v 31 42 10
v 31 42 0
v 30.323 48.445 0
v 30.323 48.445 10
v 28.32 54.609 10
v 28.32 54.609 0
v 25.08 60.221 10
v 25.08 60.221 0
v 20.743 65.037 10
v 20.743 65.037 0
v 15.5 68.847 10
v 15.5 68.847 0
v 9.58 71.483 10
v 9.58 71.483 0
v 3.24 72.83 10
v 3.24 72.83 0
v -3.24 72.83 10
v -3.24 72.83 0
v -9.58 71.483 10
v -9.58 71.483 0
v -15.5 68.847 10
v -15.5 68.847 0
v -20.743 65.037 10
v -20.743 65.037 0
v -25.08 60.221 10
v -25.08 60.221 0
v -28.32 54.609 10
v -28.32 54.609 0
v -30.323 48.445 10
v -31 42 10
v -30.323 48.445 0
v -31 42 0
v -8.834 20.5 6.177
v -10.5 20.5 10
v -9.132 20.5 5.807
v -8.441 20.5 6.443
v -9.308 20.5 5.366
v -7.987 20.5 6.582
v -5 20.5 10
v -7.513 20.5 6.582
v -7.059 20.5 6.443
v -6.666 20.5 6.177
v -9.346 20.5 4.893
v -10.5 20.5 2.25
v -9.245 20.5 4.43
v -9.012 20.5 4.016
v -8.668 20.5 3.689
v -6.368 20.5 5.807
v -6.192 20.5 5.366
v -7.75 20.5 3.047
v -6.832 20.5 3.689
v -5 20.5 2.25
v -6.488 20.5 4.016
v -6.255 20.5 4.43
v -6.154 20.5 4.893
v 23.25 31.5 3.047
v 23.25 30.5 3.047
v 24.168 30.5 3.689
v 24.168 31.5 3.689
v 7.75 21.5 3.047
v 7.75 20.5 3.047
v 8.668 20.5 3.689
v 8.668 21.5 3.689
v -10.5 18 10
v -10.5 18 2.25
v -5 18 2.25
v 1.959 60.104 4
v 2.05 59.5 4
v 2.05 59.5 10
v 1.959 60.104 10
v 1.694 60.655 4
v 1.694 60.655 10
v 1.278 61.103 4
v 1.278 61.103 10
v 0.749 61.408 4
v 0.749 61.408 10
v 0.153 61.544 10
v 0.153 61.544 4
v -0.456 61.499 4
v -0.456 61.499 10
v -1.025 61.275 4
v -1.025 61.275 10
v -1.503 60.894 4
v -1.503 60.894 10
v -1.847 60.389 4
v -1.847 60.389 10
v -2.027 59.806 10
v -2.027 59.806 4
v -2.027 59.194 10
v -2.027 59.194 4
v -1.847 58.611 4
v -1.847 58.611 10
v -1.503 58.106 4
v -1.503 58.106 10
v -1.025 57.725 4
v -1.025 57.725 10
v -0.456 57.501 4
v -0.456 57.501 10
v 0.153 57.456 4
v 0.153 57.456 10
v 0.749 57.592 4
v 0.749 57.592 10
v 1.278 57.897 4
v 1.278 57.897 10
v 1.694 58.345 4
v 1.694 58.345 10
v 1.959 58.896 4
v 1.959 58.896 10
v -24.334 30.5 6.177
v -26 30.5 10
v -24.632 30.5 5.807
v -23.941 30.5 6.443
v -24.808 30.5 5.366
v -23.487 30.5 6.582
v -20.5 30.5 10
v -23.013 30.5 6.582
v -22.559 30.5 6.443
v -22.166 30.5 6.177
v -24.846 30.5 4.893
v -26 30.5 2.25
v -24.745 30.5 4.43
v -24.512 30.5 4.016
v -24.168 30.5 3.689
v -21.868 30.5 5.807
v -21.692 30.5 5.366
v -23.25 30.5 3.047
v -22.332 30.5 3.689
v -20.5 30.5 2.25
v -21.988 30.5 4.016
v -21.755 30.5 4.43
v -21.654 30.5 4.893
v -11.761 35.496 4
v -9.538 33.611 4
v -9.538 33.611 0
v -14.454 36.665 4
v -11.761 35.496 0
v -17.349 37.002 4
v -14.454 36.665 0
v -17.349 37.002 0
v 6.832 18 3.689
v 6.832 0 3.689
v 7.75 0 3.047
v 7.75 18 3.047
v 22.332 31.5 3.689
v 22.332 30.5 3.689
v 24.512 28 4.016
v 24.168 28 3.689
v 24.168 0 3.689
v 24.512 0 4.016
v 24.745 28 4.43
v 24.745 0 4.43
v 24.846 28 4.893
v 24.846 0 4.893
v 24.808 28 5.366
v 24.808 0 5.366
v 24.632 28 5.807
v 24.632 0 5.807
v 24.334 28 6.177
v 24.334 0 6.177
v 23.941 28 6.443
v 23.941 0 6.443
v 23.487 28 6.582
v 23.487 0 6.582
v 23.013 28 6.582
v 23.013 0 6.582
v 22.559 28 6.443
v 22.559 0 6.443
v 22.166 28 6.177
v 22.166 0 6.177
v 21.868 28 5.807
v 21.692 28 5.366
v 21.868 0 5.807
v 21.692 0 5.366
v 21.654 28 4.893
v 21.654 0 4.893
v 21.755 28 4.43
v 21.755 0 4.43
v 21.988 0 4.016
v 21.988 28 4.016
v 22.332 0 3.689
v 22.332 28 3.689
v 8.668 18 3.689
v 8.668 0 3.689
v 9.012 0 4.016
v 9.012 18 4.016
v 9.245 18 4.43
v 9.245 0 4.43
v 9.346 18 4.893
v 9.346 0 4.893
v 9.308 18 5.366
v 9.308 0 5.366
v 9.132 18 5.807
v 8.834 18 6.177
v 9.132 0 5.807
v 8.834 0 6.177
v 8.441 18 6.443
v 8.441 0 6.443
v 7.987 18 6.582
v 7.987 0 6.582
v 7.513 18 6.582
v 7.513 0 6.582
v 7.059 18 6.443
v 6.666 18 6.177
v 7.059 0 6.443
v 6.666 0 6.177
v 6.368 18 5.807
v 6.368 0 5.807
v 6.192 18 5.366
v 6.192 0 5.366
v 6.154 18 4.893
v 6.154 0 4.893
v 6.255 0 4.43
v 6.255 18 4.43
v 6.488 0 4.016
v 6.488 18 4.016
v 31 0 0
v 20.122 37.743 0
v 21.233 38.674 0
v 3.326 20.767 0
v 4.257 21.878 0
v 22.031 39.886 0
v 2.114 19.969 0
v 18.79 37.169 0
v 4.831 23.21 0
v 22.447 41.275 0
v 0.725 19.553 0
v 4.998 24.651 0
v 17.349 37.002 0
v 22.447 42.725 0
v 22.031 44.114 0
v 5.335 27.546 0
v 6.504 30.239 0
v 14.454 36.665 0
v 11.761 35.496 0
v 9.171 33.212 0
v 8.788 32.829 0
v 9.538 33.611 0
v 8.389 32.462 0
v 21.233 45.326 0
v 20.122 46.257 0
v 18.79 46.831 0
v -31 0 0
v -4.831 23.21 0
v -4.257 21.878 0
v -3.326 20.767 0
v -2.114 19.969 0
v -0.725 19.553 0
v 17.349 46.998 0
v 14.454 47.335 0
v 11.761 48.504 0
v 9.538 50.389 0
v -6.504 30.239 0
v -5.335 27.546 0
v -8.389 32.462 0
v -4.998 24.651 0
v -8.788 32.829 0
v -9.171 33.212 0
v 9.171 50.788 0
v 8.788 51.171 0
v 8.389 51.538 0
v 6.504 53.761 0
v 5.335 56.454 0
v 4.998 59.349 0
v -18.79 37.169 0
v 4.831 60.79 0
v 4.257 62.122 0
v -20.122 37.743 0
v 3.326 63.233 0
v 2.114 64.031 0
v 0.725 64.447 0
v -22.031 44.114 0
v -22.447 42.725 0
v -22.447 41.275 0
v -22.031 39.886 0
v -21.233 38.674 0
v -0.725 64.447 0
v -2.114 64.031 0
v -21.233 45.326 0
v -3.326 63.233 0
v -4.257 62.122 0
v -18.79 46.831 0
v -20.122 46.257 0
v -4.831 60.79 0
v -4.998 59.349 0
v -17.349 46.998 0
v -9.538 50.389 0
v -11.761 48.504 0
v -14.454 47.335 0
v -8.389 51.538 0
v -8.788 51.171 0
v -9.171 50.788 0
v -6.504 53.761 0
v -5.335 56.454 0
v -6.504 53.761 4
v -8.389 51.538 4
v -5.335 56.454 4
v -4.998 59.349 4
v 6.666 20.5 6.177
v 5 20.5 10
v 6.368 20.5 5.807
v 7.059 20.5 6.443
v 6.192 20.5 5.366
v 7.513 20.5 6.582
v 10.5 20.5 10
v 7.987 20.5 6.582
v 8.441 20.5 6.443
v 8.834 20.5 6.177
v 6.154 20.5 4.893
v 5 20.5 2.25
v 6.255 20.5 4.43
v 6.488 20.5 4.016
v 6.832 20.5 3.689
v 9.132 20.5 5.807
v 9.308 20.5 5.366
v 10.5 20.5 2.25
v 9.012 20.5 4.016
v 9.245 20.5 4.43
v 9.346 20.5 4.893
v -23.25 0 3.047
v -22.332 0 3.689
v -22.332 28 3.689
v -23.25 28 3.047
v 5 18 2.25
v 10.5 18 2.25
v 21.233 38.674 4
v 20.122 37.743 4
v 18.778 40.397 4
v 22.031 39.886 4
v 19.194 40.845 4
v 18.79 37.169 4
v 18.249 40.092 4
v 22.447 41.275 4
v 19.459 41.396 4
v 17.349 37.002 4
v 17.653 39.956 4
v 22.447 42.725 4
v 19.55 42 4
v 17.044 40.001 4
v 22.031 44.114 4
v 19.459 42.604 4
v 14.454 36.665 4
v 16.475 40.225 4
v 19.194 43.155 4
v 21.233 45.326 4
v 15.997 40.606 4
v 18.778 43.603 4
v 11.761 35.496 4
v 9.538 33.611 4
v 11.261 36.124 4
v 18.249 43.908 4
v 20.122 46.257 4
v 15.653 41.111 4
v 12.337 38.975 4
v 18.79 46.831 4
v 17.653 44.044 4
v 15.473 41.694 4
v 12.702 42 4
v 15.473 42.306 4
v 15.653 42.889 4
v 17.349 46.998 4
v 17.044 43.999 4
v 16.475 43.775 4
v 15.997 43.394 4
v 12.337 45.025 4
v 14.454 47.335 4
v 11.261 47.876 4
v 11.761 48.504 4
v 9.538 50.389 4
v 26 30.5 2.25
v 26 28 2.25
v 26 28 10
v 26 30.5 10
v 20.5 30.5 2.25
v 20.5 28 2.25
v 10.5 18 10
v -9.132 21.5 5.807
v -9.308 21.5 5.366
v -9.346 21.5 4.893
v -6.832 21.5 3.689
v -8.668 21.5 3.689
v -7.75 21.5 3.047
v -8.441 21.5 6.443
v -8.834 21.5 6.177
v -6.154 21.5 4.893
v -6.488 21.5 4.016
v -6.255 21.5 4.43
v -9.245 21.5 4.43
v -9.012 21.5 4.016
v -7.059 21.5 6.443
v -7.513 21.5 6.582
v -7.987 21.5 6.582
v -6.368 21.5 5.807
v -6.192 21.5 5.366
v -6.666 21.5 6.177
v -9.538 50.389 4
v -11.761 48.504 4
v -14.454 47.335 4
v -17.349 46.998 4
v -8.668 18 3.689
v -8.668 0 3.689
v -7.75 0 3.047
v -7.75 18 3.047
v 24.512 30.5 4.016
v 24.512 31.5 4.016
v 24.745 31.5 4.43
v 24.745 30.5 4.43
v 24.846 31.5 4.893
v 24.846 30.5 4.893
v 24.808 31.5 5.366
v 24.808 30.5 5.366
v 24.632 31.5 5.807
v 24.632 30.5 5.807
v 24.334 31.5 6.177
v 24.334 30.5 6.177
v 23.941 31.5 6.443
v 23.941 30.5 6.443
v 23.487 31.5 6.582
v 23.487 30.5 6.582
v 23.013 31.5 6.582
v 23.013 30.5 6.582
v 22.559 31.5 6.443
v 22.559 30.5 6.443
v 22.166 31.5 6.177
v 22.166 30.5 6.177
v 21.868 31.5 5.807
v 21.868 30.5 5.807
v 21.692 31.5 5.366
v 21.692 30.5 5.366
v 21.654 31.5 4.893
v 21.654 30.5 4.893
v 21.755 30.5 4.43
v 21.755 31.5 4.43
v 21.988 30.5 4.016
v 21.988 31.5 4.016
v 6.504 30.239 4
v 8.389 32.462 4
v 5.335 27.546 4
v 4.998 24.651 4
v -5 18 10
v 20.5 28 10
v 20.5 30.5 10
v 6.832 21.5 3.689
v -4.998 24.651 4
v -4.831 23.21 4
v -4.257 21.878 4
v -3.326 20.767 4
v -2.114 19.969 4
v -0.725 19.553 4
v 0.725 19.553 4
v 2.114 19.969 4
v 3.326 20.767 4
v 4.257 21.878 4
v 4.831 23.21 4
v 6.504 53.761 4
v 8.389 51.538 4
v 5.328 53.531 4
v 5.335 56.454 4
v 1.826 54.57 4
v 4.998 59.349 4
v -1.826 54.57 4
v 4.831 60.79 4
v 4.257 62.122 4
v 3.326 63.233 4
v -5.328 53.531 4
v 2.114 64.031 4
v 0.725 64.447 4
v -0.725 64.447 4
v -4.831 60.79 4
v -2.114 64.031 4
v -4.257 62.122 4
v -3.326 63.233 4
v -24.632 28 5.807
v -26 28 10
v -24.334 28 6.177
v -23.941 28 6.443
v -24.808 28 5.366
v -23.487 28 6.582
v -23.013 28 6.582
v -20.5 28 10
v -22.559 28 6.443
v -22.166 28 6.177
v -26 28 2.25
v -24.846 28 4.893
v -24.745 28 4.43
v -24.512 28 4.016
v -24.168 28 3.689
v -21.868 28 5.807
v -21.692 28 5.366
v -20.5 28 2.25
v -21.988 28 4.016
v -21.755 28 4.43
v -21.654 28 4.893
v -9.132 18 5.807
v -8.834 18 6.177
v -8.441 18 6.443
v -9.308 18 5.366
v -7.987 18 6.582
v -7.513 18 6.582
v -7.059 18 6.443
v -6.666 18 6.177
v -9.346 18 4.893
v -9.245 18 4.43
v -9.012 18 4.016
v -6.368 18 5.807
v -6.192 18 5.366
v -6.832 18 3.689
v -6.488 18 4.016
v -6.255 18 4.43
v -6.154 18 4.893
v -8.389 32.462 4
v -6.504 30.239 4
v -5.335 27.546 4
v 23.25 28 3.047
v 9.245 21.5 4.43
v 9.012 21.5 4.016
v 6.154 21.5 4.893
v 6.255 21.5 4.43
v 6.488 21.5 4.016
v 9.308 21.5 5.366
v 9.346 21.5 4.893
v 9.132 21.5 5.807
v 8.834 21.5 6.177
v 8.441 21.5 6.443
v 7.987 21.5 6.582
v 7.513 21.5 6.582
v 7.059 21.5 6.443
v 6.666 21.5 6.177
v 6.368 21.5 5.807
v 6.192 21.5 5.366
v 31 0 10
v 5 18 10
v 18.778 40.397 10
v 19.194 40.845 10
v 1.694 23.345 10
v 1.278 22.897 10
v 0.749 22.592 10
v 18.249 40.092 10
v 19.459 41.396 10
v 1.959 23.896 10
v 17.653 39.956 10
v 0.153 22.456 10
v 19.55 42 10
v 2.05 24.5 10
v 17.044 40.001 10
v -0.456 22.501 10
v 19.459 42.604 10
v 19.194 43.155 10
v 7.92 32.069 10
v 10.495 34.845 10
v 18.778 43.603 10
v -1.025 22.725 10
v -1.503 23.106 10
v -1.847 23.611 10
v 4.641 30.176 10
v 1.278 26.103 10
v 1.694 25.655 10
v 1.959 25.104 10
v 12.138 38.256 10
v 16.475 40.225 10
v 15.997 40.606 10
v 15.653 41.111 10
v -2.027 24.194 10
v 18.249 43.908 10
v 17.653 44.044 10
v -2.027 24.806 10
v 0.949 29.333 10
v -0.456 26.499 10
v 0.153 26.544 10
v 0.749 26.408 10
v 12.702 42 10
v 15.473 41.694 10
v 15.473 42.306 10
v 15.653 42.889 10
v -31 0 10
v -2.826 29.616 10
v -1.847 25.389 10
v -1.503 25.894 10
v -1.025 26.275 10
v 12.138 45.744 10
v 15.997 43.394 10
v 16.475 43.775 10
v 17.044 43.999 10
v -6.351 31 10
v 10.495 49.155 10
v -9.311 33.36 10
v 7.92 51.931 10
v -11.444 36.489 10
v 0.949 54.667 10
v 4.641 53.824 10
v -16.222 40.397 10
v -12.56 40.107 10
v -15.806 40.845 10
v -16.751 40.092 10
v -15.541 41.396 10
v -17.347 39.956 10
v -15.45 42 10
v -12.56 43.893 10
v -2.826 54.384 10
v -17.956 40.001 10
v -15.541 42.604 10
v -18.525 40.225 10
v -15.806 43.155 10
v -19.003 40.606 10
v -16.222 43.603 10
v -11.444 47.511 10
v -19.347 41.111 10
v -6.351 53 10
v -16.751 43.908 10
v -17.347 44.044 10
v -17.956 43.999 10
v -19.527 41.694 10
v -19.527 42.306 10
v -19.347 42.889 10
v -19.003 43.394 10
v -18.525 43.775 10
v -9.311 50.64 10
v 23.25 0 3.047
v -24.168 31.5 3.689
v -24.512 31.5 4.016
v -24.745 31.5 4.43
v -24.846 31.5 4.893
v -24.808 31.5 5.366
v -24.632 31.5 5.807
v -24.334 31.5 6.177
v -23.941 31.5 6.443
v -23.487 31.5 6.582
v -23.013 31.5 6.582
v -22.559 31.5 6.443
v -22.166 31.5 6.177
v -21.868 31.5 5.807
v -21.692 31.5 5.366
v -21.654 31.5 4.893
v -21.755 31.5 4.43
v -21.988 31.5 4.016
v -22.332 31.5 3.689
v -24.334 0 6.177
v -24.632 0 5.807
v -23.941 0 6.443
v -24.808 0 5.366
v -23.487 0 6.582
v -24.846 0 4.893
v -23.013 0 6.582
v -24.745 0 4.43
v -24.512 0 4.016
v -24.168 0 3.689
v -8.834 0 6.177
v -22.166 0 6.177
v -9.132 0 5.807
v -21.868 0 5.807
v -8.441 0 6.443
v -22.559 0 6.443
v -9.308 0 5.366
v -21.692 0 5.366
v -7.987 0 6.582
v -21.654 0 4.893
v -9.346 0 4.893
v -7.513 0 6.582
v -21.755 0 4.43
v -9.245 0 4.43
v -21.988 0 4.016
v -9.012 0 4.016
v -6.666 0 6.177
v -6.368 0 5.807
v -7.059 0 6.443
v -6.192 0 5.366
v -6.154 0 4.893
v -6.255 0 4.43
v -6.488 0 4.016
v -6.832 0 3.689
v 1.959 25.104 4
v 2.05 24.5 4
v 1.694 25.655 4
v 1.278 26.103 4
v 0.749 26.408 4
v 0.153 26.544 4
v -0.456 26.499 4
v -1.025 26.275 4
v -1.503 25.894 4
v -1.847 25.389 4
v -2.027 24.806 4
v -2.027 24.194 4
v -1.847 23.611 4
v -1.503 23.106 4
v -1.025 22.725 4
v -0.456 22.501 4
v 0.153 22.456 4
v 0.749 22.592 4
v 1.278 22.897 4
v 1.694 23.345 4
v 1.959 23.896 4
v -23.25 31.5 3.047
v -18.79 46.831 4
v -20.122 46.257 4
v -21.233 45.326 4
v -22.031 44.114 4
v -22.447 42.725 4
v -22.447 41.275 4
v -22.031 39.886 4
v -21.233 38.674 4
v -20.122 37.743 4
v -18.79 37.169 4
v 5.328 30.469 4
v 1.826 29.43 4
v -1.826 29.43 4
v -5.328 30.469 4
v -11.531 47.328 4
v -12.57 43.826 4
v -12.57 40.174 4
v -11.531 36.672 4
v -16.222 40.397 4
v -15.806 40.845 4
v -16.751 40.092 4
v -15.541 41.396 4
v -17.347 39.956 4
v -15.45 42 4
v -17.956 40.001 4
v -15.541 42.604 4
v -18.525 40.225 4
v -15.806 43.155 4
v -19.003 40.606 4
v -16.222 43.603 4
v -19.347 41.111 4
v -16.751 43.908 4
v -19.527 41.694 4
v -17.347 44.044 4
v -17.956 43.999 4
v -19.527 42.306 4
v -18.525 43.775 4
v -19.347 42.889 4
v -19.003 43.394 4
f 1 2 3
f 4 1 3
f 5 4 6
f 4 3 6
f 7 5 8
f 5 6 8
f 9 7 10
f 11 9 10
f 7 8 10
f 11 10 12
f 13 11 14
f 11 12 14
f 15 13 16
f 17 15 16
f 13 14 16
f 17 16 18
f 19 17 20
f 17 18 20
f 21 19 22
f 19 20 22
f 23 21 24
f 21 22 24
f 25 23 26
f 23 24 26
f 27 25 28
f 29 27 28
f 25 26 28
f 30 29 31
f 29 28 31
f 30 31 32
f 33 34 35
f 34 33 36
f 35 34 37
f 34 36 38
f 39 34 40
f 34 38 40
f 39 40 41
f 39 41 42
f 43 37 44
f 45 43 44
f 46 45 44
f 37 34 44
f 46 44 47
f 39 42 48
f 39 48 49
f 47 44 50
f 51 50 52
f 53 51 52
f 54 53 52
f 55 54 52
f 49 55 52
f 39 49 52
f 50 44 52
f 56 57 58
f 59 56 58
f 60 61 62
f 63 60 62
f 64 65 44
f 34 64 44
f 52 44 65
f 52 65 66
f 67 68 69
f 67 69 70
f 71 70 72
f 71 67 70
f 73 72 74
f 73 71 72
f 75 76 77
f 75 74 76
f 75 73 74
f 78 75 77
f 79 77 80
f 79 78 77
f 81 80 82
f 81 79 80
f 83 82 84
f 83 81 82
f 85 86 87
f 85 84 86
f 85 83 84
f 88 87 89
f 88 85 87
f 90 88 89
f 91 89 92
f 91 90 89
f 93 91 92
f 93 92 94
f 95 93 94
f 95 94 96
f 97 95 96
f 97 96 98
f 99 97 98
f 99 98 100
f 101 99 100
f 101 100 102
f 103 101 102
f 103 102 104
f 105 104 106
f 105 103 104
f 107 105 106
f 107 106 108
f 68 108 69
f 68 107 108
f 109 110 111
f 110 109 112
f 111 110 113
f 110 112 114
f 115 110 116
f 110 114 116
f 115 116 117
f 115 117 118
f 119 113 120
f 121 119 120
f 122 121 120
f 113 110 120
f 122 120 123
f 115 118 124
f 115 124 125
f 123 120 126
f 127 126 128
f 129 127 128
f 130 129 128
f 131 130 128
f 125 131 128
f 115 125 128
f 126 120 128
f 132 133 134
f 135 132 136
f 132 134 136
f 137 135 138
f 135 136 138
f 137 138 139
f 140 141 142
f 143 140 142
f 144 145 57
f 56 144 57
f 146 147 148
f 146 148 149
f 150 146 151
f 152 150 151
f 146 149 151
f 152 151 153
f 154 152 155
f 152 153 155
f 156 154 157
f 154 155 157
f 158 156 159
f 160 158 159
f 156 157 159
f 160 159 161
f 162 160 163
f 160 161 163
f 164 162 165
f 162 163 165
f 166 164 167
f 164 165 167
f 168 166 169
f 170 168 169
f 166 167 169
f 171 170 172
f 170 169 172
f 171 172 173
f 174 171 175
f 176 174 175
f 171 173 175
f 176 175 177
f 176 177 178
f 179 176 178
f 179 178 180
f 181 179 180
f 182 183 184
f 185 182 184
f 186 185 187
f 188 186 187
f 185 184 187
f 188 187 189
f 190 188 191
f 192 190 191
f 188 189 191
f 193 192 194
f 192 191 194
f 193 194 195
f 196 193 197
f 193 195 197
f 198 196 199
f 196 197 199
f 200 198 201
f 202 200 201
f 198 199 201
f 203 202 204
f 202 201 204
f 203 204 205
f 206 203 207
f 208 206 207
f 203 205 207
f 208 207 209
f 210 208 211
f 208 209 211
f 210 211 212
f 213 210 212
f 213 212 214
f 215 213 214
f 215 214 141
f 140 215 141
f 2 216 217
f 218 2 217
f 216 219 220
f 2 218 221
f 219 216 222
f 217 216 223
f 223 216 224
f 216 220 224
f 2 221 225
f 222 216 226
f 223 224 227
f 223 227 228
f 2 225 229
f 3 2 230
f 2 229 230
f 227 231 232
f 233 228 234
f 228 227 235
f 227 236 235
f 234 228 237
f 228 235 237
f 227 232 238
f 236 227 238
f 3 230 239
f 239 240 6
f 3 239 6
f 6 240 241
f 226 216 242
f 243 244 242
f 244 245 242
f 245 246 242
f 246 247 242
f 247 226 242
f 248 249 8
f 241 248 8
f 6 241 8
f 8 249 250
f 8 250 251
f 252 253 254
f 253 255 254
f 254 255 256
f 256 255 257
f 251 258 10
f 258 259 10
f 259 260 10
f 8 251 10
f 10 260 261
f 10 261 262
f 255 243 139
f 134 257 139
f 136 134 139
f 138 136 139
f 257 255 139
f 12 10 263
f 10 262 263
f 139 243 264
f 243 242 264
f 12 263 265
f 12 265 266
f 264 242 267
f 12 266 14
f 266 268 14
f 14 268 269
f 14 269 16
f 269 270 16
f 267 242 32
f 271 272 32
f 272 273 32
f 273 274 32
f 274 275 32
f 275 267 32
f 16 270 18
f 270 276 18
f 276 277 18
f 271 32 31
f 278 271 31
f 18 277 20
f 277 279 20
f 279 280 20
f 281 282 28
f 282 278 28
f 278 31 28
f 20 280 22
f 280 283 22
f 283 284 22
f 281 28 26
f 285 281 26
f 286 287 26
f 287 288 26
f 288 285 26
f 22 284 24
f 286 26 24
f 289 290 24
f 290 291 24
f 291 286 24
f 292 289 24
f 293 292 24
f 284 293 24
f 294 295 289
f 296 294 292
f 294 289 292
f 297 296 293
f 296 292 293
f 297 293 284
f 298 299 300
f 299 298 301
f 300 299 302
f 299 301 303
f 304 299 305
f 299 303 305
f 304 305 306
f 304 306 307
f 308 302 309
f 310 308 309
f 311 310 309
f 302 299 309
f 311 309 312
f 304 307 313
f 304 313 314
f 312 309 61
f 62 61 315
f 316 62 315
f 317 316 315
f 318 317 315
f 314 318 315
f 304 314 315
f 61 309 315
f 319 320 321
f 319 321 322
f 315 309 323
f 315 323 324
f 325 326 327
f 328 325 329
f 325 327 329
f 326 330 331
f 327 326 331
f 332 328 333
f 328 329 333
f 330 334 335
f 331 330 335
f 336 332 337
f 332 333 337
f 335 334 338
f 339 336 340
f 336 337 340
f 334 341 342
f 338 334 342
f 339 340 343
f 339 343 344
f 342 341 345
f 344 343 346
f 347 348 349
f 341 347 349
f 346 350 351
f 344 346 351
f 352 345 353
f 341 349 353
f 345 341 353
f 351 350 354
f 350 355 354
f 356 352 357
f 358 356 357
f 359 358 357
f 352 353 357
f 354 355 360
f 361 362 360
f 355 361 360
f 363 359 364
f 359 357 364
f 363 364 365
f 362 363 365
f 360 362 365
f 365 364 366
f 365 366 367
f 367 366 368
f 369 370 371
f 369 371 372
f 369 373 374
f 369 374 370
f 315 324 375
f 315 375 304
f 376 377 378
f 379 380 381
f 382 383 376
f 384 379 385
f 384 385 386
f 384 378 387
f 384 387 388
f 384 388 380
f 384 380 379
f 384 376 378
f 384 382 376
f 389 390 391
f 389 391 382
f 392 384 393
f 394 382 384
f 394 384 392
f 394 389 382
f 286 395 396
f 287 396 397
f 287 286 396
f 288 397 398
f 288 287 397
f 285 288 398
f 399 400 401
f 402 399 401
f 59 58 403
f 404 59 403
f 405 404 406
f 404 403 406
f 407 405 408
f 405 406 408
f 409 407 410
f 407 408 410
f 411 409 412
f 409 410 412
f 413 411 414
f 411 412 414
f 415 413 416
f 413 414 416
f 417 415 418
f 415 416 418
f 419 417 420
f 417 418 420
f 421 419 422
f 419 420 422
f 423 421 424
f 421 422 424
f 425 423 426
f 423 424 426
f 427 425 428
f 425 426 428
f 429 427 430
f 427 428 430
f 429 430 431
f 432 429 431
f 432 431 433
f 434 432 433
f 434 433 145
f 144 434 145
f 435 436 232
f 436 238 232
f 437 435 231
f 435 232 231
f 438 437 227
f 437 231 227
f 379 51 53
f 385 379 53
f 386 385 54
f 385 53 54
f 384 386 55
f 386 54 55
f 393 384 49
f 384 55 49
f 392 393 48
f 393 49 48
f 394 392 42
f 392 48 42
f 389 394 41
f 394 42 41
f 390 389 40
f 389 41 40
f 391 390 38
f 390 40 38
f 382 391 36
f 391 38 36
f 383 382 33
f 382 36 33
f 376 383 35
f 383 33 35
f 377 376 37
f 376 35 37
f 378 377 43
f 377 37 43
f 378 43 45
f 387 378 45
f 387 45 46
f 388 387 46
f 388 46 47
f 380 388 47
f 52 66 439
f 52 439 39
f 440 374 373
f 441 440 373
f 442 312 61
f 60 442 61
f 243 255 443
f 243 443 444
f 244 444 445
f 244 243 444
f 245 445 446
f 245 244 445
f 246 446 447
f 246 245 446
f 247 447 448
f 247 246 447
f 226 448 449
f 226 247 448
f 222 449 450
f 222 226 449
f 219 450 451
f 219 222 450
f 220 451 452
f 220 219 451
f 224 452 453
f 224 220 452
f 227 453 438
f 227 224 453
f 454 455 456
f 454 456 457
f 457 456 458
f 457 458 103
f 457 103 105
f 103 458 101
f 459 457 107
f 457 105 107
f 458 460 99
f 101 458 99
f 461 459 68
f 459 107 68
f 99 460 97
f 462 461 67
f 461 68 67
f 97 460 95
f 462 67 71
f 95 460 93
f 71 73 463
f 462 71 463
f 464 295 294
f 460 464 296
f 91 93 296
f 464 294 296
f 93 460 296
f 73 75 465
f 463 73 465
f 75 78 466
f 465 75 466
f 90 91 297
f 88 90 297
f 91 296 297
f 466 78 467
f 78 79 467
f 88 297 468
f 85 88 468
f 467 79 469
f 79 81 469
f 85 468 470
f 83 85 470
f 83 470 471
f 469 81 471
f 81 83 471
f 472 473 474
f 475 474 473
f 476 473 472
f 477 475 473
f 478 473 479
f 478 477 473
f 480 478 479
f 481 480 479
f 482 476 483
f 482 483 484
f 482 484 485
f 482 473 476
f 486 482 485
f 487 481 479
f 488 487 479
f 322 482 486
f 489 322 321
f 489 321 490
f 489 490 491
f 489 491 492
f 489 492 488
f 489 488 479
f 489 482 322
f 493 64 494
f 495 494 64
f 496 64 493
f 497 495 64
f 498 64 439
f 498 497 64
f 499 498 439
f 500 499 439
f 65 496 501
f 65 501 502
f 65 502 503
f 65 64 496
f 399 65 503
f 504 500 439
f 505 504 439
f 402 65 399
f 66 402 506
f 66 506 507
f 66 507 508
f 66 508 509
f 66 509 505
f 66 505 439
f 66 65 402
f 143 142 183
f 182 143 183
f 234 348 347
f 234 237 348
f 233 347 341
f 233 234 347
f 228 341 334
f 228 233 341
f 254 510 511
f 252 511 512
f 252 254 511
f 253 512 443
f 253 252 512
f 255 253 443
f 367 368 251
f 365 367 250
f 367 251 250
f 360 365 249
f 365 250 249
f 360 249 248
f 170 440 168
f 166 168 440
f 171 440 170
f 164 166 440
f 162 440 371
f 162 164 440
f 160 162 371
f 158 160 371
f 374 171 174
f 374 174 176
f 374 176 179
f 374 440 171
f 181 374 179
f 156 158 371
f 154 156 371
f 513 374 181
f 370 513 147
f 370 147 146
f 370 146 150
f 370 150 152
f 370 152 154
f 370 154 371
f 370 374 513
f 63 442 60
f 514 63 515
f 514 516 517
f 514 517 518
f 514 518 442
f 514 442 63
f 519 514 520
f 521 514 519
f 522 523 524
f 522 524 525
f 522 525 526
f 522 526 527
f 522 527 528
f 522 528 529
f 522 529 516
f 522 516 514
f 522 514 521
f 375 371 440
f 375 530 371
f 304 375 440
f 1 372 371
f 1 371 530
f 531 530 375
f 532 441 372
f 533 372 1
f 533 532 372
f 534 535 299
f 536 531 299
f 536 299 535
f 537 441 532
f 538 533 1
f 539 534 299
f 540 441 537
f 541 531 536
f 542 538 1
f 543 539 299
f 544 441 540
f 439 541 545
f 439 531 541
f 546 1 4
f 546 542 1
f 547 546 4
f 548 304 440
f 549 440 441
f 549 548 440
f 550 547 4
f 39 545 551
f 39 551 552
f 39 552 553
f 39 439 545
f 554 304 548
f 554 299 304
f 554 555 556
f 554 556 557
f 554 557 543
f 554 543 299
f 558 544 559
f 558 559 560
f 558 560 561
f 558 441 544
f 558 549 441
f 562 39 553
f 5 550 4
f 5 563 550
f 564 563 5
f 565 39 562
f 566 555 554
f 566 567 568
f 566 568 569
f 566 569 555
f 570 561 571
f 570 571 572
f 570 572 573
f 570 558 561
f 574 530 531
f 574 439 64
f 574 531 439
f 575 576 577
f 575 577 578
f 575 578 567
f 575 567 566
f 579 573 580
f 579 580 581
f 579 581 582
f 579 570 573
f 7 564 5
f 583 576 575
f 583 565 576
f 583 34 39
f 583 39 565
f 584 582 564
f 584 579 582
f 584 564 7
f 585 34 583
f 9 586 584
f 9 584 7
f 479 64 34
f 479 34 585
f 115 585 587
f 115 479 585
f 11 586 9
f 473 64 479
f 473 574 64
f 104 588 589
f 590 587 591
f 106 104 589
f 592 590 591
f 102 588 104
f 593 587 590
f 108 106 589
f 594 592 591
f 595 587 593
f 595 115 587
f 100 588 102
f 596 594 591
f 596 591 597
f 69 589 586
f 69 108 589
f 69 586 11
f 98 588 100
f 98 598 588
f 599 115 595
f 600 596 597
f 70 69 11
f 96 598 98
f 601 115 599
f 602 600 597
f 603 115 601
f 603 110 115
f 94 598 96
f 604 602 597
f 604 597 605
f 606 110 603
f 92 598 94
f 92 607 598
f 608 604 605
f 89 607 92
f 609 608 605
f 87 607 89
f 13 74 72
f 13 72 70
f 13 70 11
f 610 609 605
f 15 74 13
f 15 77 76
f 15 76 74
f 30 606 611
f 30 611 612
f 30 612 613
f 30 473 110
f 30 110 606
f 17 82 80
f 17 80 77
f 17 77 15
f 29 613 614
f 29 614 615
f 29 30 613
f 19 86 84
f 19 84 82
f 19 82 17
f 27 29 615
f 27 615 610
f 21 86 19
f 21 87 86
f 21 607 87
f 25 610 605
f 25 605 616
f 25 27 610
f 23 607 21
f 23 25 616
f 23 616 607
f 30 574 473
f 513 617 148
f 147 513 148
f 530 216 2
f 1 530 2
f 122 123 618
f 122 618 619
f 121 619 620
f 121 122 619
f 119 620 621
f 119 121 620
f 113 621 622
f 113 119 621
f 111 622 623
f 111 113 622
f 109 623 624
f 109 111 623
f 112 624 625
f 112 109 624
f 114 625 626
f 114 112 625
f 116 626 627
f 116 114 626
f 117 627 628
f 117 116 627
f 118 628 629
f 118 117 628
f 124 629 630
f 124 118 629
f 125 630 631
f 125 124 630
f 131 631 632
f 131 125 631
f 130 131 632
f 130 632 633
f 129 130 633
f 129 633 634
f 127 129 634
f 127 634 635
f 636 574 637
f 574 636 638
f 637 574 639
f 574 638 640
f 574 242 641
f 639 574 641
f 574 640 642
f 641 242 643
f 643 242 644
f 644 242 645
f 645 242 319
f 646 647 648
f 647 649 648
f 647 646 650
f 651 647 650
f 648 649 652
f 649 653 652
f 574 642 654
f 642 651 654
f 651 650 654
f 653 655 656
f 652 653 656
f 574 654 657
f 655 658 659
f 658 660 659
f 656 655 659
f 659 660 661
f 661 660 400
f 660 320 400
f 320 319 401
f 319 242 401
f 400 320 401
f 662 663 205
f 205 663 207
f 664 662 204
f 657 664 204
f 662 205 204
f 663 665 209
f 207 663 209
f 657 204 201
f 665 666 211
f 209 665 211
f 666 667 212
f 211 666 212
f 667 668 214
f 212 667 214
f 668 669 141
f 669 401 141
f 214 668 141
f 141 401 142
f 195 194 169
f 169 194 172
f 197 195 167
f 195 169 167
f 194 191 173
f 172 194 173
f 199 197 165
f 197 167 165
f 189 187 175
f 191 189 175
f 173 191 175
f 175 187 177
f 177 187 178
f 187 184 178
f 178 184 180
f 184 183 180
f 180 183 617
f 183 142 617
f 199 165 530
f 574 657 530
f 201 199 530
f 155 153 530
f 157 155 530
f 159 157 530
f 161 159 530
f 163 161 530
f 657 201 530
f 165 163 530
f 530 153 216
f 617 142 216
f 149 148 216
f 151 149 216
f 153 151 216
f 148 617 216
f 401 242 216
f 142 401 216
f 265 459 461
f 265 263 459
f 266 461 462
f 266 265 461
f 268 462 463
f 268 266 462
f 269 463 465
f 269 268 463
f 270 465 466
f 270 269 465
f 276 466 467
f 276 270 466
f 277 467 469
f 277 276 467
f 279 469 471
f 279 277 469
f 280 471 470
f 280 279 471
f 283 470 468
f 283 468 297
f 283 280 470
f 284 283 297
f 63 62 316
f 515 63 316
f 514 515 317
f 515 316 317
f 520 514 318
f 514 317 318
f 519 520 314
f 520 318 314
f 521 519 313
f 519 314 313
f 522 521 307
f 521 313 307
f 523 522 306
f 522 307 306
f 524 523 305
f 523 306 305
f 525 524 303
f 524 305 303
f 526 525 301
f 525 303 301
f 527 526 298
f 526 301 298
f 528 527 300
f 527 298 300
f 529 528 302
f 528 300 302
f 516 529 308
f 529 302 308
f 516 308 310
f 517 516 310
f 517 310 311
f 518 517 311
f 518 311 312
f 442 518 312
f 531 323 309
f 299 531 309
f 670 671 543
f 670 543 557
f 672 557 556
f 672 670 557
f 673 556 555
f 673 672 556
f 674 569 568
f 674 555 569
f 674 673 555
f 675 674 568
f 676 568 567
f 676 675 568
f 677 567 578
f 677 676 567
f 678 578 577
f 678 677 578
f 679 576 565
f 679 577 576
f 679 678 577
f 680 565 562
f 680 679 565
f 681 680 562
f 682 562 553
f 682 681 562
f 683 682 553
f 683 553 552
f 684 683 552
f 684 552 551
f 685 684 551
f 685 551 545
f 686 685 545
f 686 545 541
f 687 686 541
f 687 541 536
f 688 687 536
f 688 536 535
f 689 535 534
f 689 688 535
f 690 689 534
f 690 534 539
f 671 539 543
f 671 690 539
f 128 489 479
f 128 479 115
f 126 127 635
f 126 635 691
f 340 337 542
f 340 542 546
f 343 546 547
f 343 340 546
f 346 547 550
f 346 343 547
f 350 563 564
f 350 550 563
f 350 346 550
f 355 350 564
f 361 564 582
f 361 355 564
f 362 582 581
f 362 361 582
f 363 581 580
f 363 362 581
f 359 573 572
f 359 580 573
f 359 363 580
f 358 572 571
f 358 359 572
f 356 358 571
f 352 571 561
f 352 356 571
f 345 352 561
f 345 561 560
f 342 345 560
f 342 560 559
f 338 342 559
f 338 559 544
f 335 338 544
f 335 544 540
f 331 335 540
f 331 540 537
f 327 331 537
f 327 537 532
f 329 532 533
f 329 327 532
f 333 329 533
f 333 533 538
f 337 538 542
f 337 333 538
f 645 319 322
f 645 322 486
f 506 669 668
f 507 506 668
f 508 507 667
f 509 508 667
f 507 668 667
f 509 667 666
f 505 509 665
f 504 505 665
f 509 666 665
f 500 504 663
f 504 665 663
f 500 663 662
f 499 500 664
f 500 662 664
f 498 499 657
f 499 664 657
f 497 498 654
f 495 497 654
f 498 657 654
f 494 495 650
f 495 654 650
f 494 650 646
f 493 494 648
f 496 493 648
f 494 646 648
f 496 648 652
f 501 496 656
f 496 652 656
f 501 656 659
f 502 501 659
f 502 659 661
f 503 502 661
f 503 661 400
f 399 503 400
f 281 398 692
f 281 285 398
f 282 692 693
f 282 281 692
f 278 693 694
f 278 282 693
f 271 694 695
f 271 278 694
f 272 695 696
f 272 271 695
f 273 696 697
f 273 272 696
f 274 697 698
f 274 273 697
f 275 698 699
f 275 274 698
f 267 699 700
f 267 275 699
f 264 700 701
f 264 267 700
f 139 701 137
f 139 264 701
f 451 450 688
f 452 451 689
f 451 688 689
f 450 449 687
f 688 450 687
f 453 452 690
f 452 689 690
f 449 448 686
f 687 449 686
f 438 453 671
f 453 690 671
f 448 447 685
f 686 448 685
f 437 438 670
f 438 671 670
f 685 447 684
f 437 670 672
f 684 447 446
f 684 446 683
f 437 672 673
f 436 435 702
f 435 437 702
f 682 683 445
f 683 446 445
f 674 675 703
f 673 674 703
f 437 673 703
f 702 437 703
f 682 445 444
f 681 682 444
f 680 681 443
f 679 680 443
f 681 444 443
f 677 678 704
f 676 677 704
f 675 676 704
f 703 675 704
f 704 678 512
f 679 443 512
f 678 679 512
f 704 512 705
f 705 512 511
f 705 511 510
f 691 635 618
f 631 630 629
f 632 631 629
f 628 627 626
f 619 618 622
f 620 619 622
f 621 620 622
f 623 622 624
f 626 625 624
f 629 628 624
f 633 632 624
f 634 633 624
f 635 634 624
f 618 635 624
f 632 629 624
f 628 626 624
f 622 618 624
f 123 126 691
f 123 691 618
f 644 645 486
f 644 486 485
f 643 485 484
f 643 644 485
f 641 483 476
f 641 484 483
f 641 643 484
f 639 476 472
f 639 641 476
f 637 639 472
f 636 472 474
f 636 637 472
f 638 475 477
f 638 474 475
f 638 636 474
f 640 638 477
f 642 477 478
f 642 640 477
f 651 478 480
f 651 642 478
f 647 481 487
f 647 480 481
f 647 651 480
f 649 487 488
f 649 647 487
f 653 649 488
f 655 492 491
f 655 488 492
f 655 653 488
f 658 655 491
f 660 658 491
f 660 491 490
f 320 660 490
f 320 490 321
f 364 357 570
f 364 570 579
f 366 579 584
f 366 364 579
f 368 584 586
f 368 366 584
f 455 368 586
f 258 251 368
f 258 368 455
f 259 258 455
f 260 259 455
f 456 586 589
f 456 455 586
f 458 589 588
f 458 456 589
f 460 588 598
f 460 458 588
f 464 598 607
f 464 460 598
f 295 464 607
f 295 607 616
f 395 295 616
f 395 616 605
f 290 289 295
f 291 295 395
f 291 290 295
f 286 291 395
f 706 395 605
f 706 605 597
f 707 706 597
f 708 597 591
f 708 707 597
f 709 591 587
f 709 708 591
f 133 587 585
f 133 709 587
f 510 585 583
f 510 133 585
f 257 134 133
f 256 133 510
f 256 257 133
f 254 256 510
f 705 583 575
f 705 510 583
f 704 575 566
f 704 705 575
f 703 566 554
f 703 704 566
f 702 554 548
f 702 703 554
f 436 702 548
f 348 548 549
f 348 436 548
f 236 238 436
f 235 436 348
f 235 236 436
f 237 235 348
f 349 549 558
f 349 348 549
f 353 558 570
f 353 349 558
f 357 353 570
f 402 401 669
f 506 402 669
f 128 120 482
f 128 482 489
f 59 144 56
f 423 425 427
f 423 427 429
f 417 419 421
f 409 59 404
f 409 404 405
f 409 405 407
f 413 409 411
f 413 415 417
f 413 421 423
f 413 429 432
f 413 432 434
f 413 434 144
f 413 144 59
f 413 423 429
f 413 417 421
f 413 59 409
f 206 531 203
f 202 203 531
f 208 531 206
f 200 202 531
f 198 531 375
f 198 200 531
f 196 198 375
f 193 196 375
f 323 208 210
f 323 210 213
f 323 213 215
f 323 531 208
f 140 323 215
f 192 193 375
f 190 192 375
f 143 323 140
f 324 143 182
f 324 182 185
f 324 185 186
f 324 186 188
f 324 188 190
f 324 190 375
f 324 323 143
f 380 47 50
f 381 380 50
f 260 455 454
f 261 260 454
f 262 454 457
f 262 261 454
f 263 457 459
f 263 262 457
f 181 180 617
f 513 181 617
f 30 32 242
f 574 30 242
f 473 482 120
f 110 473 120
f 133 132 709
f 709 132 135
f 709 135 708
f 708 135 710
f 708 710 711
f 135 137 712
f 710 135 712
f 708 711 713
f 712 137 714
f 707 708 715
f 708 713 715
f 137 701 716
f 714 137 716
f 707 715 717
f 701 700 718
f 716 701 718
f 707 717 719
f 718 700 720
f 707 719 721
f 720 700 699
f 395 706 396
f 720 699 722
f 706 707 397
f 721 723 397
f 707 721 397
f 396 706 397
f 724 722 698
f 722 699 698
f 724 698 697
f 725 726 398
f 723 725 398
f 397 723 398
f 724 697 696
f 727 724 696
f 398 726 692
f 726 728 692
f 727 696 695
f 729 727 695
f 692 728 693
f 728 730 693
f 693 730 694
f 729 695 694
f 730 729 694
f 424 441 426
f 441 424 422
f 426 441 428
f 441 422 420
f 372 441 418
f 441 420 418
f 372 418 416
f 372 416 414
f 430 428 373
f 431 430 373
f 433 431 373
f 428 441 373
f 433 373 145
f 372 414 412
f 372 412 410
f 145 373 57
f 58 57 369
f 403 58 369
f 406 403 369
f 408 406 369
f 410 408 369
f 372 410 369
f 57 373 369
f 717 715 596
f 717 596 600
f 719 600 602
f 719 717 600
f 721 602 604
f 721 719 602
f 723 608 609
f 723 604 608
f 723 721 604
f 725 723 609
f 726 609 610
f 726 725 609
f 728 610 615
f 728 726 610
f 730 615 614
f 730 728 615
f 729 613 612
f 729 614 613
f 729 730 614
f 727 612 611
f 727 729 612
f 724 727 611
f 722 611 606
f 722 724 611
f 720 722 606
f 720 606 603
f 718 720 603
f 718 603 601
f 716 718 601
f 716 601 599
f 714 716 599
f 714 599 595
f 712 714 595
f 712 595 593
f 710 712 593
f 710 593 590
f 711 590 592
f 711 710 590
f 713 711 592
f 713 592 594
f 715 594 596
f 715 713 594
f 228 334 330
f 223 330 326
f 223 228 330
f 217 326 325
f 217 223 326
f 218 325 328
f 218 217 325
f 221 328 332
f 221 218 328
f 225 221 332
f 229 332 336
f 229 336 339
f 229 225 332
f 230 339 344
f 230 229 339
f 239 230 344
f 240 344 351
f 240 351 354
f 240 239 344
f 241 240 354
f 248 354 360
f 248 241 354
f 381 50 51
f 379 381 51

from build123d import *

# Parameters (mm, degrees)
SKETCH1_R                = 12.702118755
BOSS_EXTRUDE1_DEPTH      = 10
SKETCH1_3_R              = 5
CUT_EXTRUDE1_DEPTH       = 4
SKETCH1_4_R              = 2.05
CUT_EXTRUDE3_DEPTH       = 80.937475567
CUT_EXTRUDE3_DEPTH_BACK  = 80.937475567
FILLET1_R                = 10
CUT_EXTRUDE12_START      = -5
SKETCH3_W                = 5.5
SKETCH3_H                = 2.5
CUT_EXTRUDE12_DEPTH      = 80.937475709
CUT_EXTRUDE12_DEPTH_BACK = 2.75
CUT_EXTRUDE13_DEPTH      = 31.5
CUT_EXTRUDE14_DEPTH      = 21.5


with BuildPart() as part:
    # Sketch1 → Boss-Extrude1 (new body)
    with BuildSketch(Plane(origin=(0, 0, 0), x_dir=(0, 1, 0), z_dir=(0, 0, 1))):
        with BuildLine():
            Line((0, 31), (0, -31))
            Line((0, -31), (42, -31))
            ThreePointArc((42, -31), (73, 0), (42, 31))
            Line((42, 31), (0, 31))
        make_face()
        with Locations(Location((42, 0, 0), (0, 0, 270))):
            Circle(SKETCH1_R, mode=Mode.SUBTRACT)
    extrude(amount=BOSS_EXTRUDE1_DEPTH)

    # Sketch1<3> → Cut-Extrude1 (cut)
    with BuildSketch(Plane(origin=(0, 0, 0), x_dir=(0, 1, 0), z_dir=(0, 0, 1))):
        with Locations((59.5, 0)):
            Circle(SKETCH1_3_R)
        with Locations((42, -17.5)):
            Circle(SKETCH1_3_R)
        with Locations((24.5, 0)):
            Circle(SKETCH1_3_R)
        with Locations((42, 17.5)):
            Circle(SKETCH1_3_R)
    extrude(amount=CUT_EXTRUDE1_DEPTH, mode=Mode.SUBTRACT)

    # Sketch1<4> → Cut-Extrude3 (cut, two sides)
    with BuildSketch(Plane(origin=(0, 0, 0), x_dir=(0, 1, 0), z_dir=(0, 0, 1))) as cut_extrude3_sk:
        with Locations(Location((59.5, 0, 0), (0, 0, 270))):
            Circle(SKETCH1_4_R)
        with Locations(Location((42, -17.5, 0), (0, 0, 270))):
            Circle(SKETCH1_4_R)
        with Locations(Location((24.5, 0, 0), (0, 0, 270))):
            Circle(SKETCH1_4_R)
        with Locations(Location((42, 17.5, 0), (0, 0, 270))):
            Circle(SKETCH1_4_R)
    extrude(amount=CUT_EXTRUDE3_DEPTH, mode=Mode.SUBTRACT)
    extrude(cut_extrude3_sk.sketch, amount=-CUT_EXTRUDE3_DEPTH_BACK, mode=Mode.SUBTRACT)

    # Fillet1
    fillet1_edges = [part.edges().sort_by_distance(p)[0] for p in [
        (-1.197579289, 29.354462261, 2),
        (1.197579289, 29.354462261, 2),
        (-12.645537739, 43.197579289, 2),
        (-12.645537739, 40.802420711, 2),
        (1.197579289, 54.645537739, 2),
        (-1.197579289, 54.645537739, 2),
        (12.645537739, 40.802420711, 2),
        (12.645537739, 43.197579289, 2),
    ]]
    fillet(fillet1_edges, radius=FILLET1_R)

    # Sketch3 → Cut-Extrude12 (cut, two sides)
    with BuildSketch(Plane.XY.offset(10).offset(CUT_EXTRUDE12_START)) as cut_extrude12_sk:
        with Locations((-23.25, 29.25)):
            Rectangle(SKETCH3_W, SKETCH3_H)
        with Locations((-7.75, 19.25)):
            Rectangle(SKETCH3_W, SKETCH3_H)
        with Locations((7.75, 19.25)):
            Rectangle(SKETCH3_W, SKETCH3_H)
        with Locations((23.25, 29.25)):
            Rectangle(SKETCH3_W, SKETCH3_H)
    extrude(amount=CUT_EXTRUDE12_DEPTH, mode=Mode.SUBTRACT)
    extrude(cut_extrude12_sk.sketch, amount=-CUT_EXTRUDE12_DEPTH_BACK, mode=Mode.SUBTRACT)

    # Sketch2 → Cut-Extrude13 (cut)
    with BuildSketch(Plane.XZ):
        with BuildLine():
            Line((-22.332277702, 3.689356729), (-23.25, 3.046760658))
            Line((-23.25, 3.046760658), (-24.167722298, 3.689356729))
            ThreePointArc((-24.167722298, 3.689356729), (-23.25, 6.6), (-22.332277702, 3.689356729))
        make_face()
        with BuildLine():
            Line((22.332277702, 3.689356729), (23.25, 3.046760658))
            Line((23.25, 3.046760658), (24.167722298, 3.689356729))
            ThreePointArc((24.167722298, 3.689356729), (23.25, 6.6), (22.332277702, 3.689356729))
        make_face()
    extrude(amount=-CUT_EXTRUDE13_DEPTH, mode=Mode.SUBTRACT)

    # Sketch2<3> → Cut-Extrude14 (cut)
    with BuildSketch(Plane.XZ):
        with BuildLine():
            Line((-8.667722298, 3.689356729), (-7.75, 3.046760658))
            Line((-7.75, 3.046760658), (-6.832277702, 3.689356729))
            ThreePointArc((-6.832277702, 3.689356729), (-7.75, 6.6), (-8.667722298, 3.689356729))
        make_face()
        with BuildLine():
            Line((6.832277702, 3.689356729), (7.75, 3.046760658))
            Line((7.75, 3.046760658), (8.667722298, 3.689356729))
            ThreePointArc((8.667722298, 3.689356729), (7.75, 6.6), (6.832277702, 3.689356729))
        make_face()
    extrude(amount=-CUT_EXTRUDE14_DEPTH, mode=Mode.SUBTRACT)


solid = part.part
